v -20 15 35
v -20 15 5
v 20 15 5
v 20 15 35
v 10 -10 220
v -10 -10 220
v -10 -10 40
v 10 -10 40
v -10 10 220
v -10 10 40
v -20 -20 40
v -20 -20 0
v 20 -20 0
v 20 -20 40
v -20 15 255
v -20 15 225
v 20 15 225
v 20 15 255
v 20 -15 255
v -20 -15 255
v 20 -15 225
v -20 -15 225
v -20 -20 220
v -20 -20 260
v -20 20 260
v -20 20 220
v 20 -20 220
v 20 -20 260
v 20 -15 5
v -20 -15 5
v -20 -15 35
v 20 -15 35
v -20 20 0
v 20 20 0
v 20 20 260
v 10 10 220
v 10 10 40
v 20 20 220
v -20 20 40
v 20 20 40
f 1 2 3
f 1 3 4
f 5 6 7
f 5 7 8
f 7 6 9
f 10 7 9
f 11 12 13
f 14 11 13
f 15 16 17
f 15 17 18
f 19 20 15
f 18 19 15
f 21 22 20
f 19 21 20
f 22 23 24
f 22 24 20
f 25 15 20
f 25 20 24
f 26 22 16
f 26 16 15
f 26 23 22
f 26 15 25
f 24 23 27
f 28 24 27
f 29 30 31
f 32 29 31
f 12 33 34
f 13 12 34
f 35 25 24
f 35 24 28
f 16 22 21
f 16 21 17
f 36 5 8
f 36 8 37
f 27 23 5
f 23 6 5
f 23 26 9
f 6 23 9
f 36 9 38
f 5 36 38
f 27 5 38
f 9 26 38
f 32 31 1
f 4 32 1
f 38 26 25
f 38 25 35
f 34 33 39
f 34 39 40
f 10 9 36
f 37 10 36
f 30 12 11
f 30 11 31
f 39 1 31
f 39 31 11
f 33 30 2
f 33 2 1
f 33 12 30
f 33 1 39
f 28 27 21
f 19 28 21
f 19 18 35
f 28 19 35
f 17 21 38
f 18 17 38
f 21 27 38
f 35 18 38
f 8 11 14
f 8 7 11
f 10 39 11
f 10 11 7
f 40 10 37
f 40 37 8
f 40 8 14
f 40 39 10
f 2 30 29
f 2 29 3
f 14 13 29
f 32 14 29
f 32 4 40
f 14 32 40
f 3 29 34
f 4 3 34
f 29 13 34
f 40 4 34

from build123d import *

# Parameters (mm, degrees)
SKETCH1_W           = 40
SKETCH1_H           = 40
BOSS_EXTRUDE1_DEPTH = 260
SKETCH3_W           = 40
SKETCH3_H           = 40
SKETCH3_W_2         = 20
SKETCH3_H_2         = 20
CUT_EXTRUDE1_DEPTH  = 180
SKETCH4_W           = 30
SKETCH4_H           = 30
CUT_EXTRUDE2_DEPTH  = 264.818119165


with BuildPart() as part:
    # Sketch1 → Boss-Extrude1 (new body)
    with BuildSketch(Plane.XY):
        Rectangle(SKETCH1_W, SKETCH1_H)
    extrude(amount=BOSS_EXTRUDE1_DEPTH)

    # Sketch3 → Cut-Extrude1 (cut)
    with BuildSketch(Plane.XY.offset(220)):
        Rectangle(SKETCH3_W, SKETCH3_H)
        Rectangle(SKETCH3_W_2, SKETCH3_H_2, mode=Mode.SUBTRACT)
    extrude(amount=-CUT_EXTRUDE1_DEPTH, mode=Mode.SUBTRACT)

    # Sketch4 → Cut-Extrude2 (cut, through all)
    with BuildSketch(Plane.ZY.offset(20)):
        with Locations((20, 0)):
            Rectangle(SKETCH4_W, SKETCH4_H)
        with Locations((240, 0)):
            Rectangle(SKETCH4_W, SKETCH4_H)
    extrude(amount=-CUT_EXTRUDE2_DEPTH, mode=Mode.SUBTRACT)


solid = part.part
